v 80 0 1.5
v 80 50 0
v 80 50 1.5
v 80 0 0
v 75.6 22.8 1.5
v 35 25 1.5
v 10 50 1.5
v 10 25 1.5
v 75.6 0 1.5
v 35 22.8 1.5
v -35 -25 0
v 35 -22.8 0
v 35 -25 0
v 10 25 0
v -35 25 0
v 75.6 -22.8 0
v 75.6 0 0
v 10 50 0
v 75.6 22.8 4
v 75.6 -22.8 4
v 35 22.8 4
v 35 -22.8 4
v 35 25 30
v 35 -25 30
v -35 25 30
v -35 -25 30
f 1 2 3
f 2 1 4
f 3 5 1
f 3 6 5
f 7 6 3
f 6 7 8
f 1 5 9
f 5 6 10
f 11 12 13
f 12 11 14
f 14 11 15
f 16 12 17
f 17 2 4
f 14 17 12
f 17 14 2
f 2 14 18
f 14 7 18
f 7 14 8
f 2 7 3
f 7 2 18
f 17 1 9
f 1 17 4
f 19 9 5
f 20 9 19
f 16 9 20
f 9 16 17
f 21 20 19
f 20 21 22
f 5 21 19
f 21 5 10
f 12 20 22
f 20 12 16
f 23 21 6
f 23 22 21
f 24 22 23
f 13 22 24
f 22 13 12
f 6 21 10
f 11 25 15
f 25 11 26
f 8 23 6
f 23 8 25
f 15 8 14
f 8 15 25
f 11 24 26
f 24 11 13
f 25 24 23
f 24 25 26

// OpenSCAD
// Two-part enclosure for small electronics board
// Print orientation: box upright, lid upside down (lip on top)

// ---- Parameters ----
box_x      = 70;    // box outer length (X)
box_y      = 50;    // box outer width (Y)
box_z      = 30;    // box outer height (Z)
box_w      = 2;     // box wall thickness
box_floor  = 2;     // box floor thickness
gap        = 10;    // gap between box and lid
lip_t      = 1.5;   // lid lip thickness (wall)
lip_h      = 4;     // lid lip height
eps        = 0.5;   // cut overlap

$fn = 64;

// ---- Derived ----
box_id_x = box_x - 2*box_w;   // inner length
box_id_y = box_y - 2*box_w;   // inner width
lip_w    = box_id_x - 0.4;    // lip outer length (0.2 clearance each side)
lip_d    = box_id_y - 0.4;    // lip outer width

// ---- Model ----
union() {
    // Box
    translate([-box_x/2, -box_y/2, 0])
        cube([box_x, box_y, box_floor]);
    translate([-box_x/2, -box_y/2, box_floor])
        cube([box_x, box_y, box_z - box_floor]);

    // Lid (plate + lip), centred on origin, placed on +X side
    translate([gap, 0, 0])
        union() {
            // Plate
            cube([box_x, box_y, lip_t]);
            // Lip
            translate([0, -lip_d/2, 0])
                cube([lip_w, lip_d, lip_h]);
        }
}
